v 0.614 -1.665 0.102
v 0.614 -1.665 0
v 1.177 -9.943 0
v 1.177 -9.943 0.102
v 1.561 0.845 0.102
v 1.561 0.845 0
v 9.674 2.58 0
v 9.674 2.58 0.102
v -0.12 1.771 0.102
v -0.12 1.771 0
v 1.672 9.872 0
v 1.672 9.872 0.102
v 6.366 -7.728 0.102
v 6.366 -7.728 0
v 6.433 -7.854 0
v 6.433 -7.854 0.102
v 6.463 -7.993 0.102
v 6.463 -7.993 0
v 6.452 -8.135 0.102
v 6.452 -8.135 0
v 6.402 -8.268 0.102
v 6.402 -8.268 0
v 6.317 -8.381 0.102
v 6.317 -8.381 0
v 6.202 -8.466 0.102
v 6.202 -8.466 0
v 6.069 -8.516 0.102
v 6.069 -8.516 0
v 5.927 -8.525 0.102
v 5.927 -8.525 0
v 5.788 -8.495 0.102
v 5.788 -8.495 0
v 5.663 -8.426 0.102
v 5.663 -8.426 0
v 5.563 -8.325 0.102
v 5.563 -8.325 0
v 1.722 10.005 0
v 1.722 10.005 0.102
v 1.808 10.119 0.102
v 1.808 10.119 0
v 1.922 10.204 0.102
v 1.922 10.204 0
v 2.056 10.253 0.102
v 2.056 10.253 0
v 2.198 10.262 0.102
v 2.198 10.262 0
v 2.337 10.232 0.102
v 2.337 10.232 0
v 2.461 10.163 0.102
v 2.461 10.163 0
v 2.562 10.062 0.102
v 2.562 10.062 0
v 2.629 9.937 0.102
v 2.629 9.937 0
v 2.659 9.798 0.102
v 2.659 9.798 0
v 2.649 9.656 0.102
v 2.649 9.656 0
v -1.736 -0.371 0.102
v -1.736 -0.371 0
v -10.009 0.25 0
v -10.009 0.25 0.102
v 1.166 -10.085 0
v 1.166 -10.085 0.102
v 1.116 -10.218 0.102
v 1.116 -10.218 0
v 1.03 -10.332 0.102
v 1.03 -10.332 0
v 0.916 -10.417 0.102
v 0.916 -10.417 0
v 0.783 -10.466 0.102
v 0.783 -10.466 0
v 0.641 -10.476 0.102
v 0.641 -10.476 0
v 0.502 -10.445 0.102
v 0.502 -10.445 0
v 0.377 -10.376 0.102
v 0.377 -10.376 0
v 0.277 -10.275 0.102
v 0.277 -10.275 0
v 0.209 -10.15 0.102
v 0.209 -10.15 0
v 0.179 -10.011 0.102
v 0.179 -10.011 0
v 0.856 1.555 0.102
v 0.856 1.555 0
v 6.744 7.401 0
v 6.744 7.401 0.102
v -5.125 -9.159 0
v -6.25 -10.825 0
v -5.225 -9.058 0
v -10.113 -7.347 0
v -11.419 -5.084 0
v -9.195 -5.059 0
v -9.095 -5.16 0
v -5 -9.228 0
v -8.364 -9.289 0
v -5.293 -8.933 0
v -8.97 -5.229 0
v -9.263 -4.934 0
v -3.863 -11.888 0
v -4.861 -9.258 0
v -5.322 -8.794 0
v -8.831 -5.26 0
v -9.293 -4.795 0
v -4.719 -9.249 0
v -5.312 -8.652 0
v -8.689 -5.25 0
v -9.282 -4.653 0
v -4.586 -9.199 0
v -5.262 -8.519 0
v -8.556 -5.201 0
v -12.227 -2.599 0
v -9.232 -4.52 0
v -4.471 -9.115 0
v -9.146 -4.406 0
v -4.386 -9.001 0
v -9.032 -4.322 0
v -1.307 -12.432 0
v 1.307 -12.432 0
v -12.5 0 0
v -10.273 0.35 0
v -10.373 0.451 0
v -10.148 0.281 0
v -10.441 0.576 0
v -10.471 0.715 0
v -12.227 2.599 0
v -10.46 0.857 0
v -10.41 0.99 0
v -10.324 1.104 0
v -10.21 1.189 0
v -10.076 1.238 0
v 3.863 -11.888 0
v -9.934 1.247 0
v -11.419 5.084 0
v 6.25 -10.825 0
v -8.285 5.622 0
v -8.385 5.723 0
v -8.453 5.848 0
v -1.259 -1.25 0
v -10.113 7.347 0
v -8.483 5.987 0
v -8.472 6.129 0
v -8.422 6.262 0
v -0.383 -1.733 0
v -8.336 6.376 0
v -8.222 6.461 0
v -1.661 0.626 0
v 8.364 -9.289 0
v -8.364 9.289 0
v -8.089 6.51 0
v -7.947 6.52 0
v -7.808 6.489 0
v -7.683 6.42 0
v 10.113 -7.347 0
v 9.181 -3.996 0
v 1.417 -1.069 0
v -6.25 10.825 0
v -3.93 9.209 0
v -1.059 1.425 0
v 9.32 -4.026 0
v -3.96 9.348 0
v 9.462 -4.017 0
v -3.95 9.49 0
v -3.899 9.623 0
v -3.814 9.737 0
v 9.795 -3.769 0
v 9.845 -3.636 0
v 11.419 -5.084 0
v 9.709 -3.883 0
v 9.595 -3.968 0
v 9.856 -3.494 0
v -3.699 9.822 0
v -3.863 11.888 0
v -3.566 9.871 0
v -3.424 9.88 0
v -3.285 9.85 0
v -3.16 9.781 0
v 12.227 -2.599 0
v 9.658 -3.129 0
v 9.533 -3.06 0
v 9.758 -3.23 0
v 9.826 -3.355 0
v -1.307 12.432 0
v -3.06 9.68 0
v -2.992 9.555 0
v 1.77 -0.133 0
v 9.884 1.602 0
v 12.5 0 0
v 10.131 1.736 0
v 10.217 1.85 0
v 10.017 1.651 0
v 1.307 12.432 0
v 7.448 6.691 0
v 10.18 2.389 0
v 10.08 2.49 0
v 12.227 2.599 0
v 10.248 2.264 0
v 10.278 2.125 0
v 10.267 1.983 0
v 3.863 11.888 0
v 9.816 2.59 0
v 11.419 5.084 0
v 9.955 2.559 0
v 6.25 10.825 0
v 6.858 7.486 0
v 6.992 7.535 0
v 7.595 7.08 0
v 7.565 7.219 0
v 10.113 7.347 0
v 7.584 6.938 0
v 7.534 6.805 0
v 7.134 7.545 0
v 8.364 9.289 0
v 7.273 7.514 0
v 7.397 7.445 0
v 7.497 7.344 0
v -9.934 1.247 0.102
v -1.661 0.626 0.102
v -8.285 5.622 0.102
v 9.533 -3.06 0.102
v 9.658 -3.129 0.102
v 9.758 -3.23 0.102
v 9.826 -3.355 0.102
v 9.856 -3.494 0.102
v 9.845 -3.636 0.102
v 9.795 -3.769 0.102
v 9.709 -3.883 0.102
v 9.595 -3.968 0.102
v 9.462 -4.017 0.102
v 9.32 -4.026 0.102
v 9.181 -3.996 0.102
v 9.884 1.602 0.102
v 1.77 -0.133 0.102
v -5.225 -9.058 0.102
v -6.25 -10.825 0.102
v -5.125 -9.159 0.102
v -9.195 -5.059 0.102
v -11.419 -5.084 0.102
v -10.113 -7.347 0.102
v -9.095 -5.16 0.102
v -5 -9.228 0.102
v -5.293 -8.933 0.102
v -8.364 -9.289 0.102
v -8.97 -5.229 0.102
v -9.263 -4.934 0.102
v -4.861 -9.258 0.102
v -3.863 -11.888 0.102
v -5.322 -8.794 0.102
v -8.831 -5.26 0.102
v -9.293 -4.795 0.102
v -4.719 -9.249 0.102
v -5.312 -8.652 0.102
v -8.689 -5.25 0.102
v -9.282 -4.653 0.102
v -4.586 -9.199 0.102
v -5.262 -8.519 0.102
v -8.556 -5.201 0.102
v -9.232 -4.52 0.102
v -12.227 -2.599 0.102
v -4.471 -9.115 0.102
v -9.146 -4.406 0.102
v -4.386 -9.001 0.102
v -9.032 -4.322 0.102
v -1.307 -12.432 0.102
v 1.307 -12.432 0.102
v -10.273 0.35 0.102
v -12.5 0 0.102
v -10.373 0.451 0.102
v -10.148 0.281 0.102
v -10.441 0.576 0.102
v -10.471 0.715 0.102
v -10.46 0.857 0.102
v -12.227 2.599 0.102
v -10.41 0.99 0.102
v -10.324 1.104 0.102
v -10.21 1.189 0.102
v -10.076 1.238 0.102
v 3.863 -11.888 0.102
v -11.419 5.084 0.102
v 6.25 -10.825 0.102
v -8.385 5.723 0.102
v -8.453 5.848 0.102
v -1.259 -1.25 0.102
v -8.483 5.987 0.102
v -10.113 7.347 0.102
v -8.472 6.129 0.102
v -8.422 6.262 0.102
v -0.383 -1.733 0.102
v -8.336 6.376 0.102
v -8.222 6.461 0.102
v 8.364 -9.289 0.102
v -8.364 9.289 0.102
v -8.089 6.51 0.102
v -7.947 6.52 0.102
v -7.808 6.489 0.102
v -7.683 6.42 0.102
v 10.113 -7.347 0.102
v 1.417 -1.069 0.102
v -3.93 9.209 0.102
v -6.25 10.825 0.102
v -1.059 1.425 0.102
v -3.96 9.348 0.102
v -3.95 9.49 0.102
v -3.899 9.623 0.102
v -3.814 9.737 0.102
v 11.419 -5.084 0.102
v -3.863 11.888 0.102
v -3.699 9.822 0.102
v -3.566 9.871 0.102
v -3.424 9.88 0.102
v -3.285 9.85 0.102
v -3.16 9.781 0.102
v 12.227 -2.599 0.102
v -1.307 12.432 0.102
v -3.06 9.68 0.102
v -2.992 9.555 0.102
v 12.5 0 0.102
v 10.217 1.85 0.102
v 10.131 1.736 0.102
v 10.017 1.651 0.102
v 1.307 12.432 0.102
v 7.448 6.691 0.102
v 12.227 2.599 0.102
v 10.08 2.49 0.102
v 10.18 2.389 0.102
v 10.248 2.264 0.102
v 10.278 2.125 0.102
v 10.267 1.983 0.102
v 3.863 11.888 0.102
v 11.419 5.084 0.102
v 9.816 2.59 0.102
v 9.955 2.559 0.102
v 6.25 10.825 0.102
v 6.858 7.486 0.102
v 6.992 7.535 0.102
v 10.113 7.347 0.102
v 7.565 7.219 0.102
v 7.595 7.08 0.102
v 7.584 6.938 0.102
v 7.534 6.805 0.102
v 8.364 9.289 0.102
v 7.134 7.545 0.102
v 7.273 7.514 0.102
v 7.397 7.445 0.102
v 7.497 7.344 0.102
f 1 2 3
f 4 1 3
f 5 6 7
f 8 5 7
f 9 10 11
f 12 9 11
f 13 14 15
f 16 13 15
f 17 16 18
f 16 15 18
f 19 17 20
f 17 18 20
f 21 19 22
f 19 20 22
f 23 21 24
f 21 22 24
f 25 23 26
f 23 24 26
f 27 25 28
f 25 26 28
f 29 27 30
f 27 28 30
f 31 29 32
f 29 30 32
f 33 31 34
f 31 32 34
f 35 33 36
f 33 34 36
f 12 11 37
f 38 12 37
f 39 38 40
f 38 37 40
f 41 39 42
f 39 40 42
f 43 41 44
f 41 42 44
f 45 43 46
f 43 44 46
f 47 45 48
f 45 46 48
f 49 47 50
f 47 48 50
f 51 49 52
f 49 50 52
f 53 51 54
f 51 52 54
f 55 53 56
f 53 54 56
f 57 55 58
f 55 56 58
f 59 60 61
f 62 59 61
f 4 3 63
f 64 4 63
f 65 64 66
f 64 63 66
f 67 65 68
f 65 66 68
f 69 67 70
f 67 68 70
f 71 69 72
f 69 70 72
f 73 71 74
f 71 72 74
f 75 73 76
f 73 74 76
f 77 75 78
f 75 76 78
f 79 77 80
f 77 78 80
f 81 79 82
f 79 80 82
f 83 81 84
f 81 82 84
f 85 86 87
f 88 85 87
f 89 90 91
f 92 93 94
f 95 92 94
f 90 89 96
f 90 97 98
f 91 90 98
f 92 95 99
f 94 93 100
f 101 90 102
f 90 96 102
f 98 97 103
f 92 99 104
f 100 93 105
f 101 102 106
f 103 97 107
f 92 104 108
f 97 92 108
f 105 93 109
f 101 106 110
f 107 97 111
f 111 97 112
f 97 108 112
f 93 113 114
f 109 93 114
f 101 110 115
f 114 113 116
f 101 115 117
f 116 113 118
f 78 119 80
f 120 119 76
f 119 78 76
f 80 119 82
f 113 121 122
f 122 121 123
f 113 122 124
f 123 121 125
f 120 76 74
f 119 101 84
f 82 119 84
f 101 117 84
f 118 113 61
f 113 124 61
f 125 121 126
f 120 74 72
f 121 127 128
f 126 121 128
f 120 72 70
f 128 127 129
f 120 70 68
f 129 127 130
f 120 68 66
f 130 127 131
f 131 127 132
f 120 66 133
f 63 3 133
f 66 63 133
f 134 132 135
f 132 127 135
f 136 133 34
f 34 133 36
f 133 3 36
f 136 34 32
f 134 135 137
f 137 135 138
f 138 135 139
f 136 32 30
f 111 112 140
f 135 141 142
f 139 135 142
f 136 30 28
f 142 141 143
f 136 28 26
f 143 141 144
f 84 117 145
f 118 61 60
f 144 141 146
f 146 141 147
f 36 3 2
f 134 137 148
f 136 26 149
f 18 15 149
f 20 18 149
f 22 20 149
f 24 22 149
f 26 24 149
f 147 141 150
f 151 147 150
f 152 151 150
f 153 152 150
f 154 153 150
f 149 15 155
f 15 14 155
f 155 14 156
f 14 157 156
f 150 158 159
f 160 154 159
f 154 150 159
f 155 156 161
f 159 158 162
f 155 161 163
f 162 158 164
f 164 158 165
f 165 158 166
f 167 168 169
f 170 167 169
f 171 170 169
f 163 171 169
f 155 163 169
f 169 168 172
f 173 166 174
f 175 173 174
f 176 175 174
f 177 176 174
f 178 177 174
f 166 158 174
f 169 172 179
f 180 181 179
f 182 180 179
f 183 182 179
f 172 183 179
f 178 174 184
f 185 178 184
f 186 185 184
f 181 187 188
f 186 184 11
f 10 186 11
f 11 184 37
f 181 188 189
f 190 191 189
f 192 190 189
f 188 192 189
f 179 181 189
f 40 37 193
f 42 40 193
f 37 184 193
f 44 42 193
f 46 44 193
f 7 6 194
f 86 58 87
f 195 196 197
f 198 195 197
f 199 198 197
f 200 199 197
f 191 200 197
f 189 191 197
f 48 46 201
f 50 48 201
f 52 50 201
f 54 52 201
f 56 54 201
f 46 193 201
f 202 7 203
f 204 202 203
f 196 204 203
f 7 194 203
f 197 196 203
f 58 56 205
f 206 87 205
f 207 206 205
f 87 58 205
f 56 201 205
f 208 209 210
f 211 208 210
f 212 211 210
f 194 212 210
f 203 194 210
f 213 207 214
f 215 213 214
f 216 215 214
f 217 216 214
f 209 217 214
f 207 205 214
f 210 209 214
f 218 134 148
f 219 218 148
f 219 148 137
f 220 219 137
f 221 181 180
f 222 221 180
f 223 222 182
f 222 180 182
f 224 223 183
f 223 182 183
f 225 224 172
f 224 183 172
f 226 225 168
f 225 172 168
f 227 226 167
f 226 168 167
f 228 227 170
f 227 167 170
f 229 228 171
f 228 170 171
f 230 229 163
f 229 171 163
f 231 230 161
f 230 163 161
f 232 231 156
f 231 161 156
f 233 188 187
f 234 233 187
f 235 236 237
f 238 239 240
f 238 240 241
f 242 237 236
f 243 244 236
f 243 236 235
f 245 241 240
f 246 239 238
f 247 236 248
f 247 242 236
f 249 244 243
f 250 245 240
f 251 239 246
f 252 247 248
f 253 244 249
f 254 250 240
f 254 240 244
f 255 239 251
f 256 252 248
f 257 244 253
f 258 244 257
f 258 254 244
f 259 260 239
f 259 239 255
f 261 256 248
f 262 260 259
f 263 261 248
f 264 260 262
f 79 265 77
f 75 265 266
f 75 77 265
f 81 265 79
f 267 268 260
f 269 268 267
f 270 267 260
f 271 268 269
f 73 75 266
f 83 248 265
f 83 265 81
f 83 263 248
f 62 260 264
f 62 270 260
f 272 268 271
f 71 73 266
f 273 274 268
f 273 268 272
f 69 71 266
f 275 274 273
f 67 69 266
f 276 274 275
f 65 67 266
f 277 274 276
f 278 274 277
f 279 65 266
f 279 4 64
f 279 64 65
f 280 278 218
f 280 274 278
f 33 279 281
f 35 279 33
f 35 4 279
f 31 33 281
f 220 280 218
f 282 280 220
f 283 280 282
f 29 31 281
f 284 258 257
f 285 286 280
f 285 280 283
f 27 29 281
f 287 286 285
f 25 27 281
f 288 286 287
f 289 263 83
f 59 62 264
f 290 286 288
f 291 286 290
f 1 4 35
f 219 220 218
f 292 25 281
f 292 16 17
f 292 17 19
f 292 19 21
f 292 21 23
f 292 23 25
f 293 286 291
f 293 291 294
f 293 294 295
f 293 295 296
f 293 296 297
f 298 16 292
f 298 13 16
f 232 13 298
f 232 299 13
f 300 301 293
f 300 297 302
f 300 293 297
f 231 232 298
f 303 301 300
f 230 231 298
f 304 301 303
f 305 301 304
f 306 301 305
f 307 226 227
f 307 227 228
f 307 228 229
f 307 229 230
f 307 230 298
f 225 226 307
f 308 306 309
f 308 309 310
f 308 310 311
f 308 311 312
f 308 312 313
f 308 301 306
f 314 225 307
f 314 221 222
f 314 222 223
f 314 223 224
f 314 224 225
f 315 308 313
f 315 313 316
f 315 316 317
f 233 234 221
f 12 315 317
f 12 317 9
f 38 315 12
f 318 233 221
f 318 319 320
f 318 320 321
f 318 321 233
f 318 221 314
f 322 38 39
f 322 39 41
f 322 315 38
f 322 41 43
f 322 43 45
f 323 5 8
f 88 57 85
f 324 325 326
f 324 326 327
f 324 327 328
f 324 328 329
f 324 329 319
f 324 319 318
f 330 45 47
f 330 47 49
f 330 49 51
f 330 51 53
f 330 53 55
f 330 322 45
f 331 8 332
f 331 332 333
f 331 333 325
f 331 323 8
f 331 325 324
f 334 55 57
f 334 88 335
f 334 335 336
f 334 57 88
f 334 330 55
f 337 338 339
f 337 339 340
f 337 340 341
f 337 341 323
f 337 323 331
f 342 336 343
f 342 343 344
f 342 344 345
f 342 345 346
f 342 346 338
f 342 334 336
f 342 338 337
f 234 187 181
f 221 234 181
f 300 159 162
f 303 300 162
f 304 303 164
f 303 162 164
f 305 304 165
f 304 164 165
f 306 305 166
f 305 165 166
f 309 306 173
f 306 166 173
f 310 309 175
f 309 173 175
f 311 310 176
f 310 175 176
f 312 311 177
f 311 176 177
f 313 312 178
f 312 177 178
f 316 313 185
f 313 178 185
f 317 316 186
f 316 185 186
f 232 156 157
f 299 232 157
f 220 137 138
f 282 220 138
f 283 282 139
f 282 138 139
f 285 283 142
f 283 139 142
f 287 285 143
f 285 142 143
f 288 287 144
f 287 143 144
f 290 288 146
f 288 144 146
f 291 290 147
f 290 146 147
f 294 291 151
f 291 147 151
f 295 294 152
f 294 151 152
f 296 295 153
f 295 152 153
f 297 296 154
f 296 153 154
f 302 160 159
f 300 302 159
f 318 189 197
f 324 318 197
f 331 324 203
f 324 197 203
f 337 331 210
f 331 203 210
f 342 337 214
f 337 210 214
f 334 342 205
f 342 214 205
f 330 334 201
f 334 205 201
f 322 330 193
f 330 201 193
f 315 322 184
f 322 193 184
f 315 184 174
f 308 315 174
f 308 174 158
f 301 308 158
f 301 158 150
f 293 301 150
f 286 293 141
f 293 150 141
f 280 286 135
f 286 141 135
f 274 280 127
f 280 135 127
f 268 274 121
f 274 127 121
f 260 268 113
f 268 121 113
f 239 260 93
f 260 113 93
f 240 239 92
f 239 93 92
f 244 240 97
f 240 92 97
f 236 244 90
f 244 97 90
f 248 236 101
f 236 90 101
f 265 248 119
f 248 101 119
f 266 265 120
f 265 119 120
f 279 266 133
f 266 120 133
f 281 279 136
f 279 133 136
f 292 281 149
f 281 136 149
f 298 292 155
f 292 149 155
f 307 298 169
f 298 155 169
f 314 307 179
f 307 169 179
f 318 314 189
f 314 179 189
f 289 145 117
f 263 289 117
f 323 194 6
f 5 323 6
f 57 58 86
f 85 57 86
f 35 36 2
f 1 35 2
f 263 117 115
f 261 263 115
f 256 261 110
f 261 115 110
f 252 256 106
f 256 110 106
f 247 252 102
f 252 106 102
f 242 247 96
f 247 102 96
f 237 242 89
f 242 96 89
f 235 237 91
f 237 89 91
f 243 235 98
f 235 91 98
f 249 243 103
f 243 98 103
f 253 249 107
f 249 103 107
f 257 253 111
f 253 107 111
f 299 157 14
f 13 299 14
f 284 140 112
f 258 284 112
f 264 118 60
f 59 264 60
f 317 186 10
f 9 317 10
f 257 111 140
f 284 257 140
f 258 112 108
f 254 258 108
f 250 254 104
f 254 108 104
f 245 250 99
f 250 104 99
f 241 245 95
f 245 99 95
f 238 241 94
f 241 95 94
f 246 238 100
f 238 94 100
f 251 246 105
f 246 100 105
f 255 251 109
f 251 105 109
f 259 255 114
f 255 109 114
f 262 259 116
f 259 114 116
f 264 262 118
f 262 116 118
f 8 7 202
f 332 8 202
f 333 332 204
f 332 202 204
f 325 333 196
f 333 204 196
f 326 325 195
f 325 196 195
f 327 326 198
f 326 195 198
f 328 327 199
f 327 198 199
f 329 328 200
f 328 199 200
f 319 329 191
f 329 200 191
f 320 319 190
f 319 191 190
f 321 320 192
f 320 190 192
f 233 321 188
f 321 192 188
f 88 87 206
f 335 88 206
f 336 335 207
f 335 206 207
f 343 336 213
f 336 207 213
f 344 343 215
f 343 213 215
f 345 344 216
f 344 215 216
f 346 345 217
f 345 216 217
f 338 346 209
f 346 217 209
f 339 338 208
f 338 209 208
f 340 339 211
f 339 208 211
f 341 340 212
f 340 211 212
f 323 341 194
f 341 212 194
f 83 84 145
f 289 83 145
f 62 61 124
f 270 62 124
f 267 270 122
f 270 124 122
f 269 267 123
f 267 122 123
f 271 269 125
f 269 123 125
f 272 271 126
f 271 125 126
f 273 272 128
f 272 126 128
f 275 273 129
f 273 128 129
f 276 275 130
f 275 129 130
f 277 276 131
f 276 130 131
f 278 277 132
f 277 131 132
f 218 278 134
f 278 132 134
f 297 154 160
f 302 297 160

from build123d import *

# Parameters (mm, degrees)
F0_R     = 12.5
F1_DEPTH = 0.1016


with BuildPart() as f1:
    # F0 (on Top) → F1 (new body)
    with BuildSketch(Plane.XY):
        Circle(F0_R)
        with BuildLine():
            Line((2.648541, 9.655839), (0.856066, 1.554615))
            Line((0.856066, 1.554615), (6.743845, 7.400713))
            ThreePointArc((6.743845, 7.400713), (7.450947, 7.398201), (7.448436, 6.691099))
            Line((7.448436, 6.691099), (1.560657, 0.845001))
            Line((1.560657, 0.845001), (9.674411, 2.579878))
            ThreePointArc((9.674411, 2.579878), (10.267905, 2.195477), (9.883504, 1.601982))
            Line((9.883504, 1.601982), (1.76975, -0.132895))
            Line((1.76975, -0.132895), (9.53342, -3.06005))
            ThreePointArc((9.53342, -3.06005), (9.824876, -3.704296), (9.18063, -3.995752))
            Line((9.18063, -3.995752), (1.41696, -1.068598))
            Line((1.41696, -1.068598), (6.365635, -7.728434))
            ThreePointArc((6.365635, -7.728434), (6.262518, -8.427981), (5.56297, -8.324864))
            Line((5.56297, -8.324864), (0.614295, -1.665028))
            Line((0.614295, -1.665028), (1.176807, -9.943094))
            ThreePointArc((1.176807, -9.943094), (0.711855, -10.475842), (0.179107, -10.01089))
            Line((0.179107, -10.01089), (-0.383404, -1.732824))
            Line((-0.383404, -1.732824), (-4.38565, -9.000893))
            ThreePointArc((-4.38565, -9.000893), (-5.064817, -9.197697), (-5.261621, -8.518529))
            Line((-5.261621, -8.518529), (-1.259375, -1.25046))
            Line((-1.259375, -1.25046), (-8.555694, -5.200972))
            ThreePointArc((-8.555694, -5.200972), (-9.233446, -4.999348), (-9.031822, -4.321596))
            Line((-9.031822, -4.321596), (-1.735504, -0.371084))
            Line((-1.735504, -0.371084), (-10.009365, 0.250222))
            ThreePointArc((-10.009365, 0.250222), (-10.47052, 0.786259), (-9.934483, 1.247414))
            Line((-9.934483, 1.247414), (-1.660622, 0.626108))
            Line((-1.660622, 0.626108), (-8.285134, 5.621971))
            ThreePointArc((-8.285134, 5.621971), (-8.383279, 6.322234), (-7.683016, 6.420379))
            Line((-7.683016, 6.420379), (-1.058504, 1.424516))
            Line((-1.058504, 1.424516), (-3.930431, 9.208785))
            ThreePointArc((-3.930431, 9.208785), (-3.634405, 9.850944), (-2.992246, 9.554918))
            Line((-2.992246, 9.554918), (-0.120319, 1.77065))
            Line((-0.120319, 1.77065), (1.672156, 9.871874))
            ThreePointArc((1.672156, 9.871874), (2.268366, 10.252049), (2.648541, 9.655839))
        make_face(mode=Mode.SUBTRACT)
    extrude(amount=F1_DEPTH)


solid = f1.part
